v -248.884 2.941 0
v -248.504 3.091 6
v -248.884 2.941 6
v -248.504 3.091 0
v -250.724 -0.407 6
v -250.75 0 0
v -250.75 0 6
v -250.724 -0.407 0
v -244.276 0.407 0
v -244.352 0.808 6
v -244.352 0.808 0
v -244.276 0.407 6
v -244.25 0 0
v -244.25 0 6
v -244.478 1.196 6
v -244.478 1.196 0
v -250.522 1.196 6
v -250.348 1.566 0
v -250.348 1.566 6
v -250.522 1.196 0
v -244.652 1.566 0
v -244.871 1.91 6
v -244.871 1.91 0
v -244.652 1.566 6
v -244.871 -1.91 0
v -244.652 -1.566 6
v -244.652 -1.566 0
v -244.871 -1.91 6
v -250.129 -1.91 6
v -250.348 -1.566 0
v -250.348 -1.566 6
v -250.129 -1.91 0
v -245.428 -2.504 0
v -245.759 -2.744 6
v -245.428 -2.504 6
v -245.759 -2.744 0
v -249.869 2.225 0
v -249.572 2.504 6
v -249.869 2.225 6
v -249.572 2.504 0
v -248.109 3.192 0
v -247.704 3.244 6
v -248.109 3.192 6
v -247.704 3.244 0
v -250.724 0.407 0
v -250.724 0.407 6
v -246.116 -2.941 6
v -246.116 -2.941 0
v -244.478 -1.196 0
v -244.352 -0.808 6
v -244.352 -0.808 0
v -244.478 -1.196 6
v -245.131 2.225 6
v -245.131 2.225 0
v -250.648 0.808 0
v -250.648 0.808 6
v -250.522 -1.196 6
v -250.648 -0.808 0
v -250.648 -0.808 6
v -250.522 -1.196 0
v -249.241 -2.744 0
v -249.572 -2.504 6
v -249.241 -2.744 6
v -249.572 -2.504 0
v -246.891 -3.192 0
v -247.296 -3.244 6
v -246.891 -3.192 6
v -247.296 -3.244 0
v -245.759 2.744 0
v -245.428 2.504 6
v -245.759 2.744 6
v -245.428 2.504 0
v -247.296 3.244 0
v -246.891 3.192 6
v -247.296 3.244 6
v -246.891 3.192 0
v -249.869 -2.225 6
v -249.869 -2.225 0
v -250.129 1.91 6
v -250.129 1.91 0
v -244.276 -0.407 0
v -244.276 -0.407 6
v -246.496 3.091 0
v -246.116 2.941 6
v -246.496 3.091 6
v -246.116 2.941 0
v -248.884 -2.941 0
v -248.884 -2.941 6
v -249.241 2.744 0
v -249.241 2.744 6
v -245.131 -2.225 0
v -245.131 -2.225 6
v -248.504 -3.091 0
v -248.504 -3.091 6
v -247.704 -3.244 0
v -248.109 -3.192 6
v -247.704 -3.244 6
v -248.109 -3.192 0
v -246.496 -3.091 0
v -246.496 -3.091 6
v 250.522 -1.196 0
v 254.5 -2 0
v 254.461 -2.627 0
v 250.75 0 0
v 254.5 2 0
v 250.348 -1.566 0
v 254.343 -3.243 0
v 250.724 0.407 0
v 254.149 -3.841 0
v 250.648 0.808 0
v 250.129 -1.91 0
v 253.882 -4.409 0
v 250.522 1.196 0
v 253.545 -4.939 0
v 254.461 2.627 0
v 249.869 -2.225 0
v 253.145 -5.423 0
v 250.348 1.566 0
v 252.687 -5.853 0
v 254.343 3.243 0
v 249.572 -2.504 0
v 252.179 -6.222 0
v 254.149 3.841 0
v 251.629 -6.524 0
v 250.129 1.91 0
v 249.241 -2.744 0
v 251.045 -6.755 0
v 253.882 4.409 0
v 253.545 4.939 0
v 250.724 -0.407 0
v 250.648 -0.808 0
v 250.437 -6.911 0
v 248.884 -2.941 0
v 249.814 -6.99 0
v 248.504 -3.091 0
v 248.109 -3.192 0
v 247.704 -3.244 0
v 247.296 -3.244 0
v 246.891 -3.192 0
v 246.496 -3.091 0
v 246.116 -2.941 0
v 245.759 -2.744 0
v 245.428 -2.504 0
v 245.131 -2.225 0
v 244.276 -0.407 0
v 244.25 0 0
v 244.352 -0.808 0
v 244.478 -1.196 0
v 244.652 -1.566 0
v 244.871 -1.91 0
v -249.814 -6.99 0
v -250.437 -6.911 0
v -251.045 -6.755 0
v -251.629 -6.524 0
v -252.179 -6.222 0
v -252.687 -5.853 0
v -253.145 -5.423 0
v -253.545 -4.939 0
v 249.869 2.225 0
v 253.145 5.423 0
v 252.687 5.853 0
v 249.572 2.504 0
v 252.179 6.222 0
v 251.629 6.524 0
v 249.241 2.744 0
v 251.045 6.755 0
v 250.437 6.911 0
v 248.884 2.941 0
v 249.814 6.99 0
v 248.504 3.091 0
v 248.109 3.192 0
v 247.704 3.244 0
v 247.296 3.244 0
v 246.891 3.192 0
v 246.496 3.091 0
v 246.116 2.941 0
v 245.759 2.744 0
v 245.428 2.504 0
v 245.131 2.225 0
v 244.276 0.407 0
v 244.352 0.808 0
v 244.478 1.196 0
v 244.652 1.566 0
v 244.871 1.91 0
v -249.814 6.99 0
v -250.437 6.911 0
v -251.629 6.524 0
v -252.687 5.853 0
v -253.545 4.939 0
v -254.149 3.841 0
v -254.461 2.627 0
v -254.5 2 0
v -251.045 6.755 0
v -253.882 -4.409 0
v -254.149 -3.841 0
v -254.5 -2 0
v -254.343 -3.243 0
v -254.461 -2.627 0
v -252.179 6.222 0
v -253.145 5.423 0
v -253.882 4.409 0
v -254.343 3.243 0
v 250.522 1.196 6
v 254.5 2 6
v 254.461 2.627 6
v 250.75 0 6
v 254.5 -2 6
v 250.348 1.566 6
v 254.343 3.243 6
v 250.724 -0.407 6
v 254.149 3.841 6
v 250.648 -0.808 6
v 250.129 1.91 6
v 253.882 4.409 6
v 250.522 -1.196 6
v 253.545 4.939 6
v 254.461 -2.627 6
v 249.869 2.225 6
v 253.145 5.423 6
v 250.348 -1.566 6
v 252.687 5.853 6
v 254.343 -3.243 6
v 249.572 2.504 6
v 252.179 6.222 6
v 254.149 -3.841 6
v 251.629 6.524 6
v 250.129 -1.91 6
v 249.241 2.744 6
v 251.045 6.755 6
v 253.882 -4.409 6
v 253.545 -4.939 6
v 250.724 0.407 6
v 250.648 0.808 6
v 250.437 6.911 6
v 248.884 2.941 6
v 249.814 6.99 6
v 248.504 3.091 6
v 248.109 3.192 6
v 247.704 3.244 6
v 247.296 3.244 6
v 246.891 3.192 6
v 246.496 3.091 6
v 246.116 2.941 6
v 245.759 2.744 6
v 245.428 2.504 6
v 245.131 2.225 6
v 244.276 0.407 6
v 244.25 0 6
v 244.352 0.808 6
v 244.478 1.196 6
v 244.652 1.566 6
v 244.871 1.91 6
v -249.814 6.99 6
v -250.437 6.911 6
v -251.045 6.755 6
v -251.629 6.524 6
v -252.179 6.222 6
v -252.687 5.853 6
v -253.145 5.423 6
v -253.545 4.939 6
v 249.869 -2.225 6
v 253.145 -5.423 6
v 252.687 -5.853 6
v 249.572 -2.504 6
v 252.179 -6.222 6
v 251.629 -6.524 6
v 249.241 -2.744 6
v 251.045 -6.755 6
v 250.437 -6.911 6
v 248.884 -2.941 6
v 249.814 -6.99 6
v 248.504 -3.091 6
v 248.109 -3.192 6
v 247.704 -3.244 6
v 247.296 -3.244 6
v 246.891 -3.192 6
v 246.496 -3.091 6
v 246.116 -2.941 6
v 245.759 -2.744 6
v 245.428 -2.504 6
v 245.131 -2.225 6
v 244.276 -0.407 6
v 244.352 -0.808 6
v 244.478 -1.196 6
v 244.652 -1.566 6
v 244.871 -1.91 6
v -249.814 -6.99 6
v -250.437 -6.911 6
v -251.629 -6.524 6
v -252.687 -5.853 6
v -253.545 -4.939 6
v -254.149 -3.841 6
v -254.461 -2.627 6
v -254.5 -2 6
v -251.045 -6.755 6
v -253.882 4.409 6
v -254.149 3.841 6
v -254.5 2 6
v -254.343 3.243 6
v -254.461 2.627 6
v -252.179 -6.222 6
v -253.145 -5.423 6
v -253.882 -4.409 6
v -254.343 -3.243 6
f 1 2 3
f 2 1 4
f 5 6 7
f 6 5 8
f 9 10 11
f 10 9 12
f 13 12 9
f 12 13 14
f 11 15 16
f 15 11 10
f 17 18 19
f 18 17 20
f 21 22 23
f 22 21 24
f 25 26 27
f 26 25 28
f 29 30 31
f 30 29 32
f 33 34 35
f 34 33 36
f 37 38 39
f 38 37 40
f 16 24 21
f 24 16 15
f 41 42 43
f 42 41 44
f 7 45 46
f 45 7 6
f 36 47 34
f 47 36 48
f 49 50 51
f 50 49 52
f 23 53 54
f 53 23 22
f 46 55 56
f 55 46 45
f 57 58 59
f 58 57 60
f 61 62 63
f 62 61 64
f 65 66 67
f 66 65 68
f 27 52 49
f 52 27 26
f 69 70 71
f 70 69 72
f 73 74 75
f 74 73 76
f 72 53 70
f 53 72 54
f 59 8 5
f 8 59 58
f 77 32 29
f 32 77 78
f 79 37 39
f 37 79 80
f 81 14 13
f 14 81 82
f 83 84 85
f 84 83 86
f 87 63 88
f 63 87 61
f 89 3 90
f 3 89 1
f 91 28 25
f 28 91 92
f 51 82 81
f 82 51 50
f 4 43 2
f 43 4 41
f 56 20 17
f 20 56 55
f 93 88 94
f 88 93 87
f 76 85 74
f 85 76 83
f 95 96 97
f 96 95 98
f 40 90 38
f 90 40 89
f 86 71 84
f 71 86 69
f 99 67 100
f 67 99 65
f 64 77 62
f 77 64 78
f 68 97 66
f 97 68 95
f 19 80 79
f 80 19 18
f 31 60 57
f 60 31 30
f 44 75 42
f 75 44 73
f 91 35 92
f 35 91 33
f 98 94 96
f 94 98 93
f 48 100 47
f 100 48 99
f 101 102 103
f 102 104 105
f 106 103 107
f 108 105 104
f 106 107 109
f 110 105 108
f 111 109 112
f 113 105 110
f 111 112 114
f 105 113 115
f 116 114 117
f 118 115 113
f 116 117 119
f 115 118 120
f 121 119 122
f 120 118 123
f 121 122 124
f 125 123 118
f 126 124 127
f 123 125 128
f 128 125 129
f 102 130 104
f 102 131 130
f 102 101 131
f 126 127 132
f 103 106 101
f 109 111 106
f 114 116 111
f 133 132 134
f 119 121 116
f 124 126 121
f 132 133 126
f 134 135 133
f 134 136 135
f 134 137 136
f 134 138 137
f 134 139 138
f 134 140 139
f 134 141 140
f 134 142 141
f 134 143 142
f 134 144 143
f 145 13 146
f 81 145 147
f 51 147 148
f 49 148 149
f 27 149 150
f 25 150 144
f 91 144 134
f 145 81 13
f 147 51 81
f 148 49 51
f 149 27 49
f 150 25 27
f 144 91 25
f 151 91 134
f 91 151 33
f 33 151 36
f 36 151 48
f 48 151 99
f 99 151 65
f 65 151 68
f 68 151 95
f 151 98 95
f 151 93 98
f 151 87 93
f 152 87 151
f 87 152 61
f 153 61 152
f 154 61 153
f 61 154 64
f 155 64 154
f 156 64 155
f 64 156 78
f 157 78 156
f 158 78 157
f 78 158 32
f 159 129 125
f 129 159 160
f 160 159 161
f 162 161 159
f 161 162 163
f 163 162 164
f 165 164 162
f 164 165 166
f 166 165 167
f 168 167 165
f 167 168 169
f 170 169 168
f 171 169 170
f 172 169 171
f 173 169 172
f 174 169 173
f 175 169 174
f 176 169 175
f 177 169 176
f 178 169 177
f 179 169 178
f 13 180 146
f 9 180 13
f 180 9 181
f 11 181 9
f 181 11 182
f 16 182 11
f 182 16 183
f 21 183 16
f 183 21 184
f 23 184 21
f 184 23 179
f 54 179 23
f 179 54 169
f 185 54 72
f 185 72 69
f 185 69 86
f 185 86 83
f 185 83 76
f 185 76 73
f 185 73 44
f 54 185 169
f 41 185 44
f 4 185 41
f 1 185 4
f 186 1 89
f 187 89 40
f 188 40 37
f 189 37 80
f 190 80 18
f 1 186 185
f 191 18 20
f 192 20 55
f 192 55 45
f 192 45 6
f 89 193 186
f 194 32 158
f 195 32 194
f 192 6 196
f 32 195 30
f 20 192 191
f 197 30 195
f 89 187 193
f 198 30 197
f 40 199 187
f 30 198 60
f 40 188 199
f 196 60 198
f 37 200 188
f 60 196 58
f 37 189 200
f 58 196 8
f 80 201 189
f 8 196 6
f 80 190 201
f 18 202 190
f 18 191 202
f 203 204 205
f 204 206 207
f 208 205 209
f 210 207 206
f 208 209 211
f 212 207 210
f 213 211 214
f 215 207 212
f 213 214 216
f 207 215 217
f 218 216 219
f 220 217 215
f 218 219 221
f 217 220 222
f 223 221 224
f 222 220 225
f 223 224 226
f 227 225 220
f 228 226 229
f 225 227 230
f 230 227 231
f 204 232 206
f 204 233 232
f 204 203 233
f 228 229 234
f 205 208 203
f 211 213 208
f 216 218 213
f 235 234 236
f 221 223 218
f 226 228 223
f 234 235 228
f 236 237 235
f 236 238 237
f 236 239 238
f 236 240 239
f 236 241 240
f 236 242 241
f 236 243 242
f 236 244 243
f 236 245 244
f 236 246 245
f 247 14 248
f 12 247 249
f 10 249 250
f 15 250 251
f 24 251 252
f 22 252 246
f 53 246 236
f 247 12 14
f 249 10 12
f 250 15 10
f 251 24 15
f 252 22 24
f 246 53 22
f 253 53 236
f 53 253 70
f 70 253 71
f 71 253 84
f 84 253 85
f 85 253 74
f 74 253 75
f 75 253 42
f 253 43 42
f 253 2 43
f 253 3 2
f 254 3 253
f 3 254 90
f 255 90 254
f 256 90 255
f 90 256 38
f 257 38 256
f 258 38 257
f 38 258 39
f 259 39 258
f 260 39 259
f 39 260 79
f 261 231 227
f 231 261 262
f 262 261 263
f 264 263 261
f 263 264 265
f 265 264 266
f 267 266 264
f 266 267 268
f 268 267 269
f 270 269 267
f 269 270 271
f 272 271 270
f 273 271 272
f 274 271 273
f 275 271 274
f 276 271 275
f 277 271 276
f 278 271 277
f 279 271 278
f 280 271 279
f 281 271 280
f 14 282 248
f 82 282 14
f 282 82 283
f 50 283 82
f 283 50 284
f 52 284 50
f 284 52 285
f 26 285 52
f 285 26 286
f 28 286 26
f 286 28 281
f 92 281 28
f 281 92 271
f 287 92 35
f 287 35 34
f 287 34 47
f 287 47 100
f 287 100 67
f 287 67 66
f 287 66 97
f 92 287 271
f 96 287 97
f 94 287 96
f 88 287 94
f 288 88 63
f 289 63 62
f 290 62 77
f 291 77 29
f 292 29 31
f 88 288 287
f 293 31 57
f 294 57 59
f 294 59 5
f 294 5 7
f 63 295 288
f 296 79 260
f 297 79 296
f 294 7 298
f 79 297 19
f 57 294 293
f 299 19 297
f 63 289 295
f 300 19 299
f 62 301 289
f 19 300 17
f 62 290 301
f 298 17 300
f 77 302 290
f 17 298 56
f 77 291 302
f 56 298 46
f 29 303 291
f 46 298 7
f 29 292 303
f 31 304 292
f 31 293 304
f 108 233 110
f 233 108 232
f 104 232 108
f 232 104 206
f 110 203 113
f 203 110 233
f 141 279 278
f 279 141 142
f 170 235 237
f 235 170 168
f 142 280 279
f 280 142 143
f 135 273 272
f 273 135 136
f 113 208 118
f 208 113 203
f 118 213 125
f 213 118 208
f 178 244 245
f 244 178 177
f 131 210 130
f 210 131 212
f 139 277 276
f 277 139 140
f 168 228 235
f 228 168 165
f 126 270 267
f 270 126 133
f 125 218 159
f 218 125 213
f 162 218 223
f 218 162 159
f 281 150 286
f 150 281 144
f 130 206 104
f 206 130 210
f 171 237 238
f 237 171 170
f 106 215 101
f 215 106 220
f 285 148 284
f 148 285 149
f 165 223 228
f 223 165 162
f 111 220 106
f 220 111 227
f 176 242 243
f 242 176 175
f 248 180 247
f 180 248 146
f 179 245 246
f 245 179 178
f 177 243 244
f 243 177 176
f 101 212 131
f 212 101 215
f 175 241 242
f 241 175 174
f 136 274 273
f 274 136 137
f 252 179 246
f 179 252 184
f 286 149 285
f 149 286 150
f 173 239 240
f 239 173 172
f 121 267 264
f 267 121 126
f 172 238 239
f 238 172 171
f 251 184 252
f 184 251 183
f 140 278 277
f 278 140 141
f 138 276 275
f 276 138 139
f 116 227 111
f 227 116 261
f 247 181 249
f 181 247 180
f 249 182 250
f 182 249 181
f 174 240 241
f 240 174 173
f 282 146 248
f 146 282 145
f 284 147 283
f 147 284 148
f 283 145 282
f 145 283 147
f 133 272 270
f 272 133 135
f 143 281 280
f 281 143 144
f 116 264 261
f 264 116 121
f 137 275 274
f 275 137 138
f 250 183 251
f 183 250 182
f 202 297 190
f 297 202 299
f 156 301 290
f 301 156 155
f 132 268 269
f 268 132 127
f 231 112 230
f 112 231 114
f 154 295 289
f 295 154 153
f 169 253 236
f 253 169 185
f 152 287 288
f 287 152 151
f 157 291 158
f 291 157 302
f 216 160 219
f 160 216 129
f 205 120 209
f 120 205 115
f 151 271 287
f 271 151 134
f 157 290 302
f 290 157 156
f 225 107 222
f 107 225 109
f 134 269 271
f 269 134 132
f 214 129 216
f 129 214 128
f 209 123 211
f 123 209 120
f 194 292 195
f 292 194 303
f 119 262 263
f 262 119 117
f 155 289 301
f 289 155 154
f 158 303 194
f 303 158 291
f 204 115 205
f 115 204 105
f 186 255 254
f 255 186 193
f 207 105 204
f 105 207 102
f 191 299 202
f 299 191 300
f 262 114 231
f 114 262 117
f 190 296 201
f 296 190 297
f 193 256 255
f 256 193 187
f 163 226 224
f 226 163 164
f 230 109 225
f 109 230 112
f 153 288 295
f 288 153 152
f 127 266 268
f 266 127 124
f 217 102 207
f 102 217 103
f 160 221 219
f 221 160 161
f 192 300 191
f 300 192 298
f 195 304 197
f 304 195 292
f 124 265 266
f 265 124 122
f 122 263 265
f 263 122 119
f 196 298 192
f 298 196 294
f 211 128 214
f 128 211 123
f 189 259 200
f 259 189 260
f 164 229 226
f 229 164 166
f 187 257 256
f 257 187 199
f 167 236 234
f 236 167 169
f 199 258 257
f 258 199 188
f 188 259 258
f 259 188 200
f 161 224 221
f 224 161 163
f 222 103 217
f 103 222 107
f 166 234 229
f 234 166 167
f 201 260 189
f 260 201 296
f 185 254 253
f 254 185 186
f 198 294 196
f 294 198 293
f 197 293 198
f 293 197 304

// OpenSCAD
$fn = 50;


difference() {
	union() {
		hull() {
			translate(v = [-249.5000000000, 2.0000000000, 0]) {
				cylinder(h = 6, r = 5);
			}
			translate(v = [249.5000000000, 2.0000000000, 0]) {
				cylinder(h = 6, r = 5);
			}
			translate(v = [-249.5000000000, -2.0000000000, 0]) {
				cylinder(h = 6, r = 5);
			}
			translate(v = [249.5000000000, -2.0000000000, 0]) {
				cylinder(h = 6, r = 5);
			}
		}
	}
	union() {
		translate(v = [-247.5000000000, 0.0000000000, 0]) {
			cylinder(h = 6, r = 3.2500000000);
		}
		translate(v = [247.5000000000, 0.0000000000, 0]) {
			cylinder(h = 6, r = 3.2500000000);
		}
		translate(v = [-247.5000000000, 0.0000000000, 0]) {
			cylinder(h = 6, r = 1.8000000000);
		}
		translate(v = [247.5000000000, 0.0000000000, 0]) {
			cylinder(h = 6, r = 1.8000000000);
		}
		translate(v = [-247.5000000000, 0.0000000000, 0]) {
			cylinder(h = 6, r = 1.8000000000);
		}
		translate(v = [247.5000000000, 0.0000000000, 0]) {
			cylinder(h = 6, r = 1.8000000000);
		}
		translate(v = [-247.5000000000, 0.0000000000, 0]) {
			cylinder(h = 6, r = 1.8000000000);
		}
		translate(v = [247.5000000000, 0.0000000000, 0]) {
			cylinder(h = 6, r = 1.8000000000);
		}
	}
}
